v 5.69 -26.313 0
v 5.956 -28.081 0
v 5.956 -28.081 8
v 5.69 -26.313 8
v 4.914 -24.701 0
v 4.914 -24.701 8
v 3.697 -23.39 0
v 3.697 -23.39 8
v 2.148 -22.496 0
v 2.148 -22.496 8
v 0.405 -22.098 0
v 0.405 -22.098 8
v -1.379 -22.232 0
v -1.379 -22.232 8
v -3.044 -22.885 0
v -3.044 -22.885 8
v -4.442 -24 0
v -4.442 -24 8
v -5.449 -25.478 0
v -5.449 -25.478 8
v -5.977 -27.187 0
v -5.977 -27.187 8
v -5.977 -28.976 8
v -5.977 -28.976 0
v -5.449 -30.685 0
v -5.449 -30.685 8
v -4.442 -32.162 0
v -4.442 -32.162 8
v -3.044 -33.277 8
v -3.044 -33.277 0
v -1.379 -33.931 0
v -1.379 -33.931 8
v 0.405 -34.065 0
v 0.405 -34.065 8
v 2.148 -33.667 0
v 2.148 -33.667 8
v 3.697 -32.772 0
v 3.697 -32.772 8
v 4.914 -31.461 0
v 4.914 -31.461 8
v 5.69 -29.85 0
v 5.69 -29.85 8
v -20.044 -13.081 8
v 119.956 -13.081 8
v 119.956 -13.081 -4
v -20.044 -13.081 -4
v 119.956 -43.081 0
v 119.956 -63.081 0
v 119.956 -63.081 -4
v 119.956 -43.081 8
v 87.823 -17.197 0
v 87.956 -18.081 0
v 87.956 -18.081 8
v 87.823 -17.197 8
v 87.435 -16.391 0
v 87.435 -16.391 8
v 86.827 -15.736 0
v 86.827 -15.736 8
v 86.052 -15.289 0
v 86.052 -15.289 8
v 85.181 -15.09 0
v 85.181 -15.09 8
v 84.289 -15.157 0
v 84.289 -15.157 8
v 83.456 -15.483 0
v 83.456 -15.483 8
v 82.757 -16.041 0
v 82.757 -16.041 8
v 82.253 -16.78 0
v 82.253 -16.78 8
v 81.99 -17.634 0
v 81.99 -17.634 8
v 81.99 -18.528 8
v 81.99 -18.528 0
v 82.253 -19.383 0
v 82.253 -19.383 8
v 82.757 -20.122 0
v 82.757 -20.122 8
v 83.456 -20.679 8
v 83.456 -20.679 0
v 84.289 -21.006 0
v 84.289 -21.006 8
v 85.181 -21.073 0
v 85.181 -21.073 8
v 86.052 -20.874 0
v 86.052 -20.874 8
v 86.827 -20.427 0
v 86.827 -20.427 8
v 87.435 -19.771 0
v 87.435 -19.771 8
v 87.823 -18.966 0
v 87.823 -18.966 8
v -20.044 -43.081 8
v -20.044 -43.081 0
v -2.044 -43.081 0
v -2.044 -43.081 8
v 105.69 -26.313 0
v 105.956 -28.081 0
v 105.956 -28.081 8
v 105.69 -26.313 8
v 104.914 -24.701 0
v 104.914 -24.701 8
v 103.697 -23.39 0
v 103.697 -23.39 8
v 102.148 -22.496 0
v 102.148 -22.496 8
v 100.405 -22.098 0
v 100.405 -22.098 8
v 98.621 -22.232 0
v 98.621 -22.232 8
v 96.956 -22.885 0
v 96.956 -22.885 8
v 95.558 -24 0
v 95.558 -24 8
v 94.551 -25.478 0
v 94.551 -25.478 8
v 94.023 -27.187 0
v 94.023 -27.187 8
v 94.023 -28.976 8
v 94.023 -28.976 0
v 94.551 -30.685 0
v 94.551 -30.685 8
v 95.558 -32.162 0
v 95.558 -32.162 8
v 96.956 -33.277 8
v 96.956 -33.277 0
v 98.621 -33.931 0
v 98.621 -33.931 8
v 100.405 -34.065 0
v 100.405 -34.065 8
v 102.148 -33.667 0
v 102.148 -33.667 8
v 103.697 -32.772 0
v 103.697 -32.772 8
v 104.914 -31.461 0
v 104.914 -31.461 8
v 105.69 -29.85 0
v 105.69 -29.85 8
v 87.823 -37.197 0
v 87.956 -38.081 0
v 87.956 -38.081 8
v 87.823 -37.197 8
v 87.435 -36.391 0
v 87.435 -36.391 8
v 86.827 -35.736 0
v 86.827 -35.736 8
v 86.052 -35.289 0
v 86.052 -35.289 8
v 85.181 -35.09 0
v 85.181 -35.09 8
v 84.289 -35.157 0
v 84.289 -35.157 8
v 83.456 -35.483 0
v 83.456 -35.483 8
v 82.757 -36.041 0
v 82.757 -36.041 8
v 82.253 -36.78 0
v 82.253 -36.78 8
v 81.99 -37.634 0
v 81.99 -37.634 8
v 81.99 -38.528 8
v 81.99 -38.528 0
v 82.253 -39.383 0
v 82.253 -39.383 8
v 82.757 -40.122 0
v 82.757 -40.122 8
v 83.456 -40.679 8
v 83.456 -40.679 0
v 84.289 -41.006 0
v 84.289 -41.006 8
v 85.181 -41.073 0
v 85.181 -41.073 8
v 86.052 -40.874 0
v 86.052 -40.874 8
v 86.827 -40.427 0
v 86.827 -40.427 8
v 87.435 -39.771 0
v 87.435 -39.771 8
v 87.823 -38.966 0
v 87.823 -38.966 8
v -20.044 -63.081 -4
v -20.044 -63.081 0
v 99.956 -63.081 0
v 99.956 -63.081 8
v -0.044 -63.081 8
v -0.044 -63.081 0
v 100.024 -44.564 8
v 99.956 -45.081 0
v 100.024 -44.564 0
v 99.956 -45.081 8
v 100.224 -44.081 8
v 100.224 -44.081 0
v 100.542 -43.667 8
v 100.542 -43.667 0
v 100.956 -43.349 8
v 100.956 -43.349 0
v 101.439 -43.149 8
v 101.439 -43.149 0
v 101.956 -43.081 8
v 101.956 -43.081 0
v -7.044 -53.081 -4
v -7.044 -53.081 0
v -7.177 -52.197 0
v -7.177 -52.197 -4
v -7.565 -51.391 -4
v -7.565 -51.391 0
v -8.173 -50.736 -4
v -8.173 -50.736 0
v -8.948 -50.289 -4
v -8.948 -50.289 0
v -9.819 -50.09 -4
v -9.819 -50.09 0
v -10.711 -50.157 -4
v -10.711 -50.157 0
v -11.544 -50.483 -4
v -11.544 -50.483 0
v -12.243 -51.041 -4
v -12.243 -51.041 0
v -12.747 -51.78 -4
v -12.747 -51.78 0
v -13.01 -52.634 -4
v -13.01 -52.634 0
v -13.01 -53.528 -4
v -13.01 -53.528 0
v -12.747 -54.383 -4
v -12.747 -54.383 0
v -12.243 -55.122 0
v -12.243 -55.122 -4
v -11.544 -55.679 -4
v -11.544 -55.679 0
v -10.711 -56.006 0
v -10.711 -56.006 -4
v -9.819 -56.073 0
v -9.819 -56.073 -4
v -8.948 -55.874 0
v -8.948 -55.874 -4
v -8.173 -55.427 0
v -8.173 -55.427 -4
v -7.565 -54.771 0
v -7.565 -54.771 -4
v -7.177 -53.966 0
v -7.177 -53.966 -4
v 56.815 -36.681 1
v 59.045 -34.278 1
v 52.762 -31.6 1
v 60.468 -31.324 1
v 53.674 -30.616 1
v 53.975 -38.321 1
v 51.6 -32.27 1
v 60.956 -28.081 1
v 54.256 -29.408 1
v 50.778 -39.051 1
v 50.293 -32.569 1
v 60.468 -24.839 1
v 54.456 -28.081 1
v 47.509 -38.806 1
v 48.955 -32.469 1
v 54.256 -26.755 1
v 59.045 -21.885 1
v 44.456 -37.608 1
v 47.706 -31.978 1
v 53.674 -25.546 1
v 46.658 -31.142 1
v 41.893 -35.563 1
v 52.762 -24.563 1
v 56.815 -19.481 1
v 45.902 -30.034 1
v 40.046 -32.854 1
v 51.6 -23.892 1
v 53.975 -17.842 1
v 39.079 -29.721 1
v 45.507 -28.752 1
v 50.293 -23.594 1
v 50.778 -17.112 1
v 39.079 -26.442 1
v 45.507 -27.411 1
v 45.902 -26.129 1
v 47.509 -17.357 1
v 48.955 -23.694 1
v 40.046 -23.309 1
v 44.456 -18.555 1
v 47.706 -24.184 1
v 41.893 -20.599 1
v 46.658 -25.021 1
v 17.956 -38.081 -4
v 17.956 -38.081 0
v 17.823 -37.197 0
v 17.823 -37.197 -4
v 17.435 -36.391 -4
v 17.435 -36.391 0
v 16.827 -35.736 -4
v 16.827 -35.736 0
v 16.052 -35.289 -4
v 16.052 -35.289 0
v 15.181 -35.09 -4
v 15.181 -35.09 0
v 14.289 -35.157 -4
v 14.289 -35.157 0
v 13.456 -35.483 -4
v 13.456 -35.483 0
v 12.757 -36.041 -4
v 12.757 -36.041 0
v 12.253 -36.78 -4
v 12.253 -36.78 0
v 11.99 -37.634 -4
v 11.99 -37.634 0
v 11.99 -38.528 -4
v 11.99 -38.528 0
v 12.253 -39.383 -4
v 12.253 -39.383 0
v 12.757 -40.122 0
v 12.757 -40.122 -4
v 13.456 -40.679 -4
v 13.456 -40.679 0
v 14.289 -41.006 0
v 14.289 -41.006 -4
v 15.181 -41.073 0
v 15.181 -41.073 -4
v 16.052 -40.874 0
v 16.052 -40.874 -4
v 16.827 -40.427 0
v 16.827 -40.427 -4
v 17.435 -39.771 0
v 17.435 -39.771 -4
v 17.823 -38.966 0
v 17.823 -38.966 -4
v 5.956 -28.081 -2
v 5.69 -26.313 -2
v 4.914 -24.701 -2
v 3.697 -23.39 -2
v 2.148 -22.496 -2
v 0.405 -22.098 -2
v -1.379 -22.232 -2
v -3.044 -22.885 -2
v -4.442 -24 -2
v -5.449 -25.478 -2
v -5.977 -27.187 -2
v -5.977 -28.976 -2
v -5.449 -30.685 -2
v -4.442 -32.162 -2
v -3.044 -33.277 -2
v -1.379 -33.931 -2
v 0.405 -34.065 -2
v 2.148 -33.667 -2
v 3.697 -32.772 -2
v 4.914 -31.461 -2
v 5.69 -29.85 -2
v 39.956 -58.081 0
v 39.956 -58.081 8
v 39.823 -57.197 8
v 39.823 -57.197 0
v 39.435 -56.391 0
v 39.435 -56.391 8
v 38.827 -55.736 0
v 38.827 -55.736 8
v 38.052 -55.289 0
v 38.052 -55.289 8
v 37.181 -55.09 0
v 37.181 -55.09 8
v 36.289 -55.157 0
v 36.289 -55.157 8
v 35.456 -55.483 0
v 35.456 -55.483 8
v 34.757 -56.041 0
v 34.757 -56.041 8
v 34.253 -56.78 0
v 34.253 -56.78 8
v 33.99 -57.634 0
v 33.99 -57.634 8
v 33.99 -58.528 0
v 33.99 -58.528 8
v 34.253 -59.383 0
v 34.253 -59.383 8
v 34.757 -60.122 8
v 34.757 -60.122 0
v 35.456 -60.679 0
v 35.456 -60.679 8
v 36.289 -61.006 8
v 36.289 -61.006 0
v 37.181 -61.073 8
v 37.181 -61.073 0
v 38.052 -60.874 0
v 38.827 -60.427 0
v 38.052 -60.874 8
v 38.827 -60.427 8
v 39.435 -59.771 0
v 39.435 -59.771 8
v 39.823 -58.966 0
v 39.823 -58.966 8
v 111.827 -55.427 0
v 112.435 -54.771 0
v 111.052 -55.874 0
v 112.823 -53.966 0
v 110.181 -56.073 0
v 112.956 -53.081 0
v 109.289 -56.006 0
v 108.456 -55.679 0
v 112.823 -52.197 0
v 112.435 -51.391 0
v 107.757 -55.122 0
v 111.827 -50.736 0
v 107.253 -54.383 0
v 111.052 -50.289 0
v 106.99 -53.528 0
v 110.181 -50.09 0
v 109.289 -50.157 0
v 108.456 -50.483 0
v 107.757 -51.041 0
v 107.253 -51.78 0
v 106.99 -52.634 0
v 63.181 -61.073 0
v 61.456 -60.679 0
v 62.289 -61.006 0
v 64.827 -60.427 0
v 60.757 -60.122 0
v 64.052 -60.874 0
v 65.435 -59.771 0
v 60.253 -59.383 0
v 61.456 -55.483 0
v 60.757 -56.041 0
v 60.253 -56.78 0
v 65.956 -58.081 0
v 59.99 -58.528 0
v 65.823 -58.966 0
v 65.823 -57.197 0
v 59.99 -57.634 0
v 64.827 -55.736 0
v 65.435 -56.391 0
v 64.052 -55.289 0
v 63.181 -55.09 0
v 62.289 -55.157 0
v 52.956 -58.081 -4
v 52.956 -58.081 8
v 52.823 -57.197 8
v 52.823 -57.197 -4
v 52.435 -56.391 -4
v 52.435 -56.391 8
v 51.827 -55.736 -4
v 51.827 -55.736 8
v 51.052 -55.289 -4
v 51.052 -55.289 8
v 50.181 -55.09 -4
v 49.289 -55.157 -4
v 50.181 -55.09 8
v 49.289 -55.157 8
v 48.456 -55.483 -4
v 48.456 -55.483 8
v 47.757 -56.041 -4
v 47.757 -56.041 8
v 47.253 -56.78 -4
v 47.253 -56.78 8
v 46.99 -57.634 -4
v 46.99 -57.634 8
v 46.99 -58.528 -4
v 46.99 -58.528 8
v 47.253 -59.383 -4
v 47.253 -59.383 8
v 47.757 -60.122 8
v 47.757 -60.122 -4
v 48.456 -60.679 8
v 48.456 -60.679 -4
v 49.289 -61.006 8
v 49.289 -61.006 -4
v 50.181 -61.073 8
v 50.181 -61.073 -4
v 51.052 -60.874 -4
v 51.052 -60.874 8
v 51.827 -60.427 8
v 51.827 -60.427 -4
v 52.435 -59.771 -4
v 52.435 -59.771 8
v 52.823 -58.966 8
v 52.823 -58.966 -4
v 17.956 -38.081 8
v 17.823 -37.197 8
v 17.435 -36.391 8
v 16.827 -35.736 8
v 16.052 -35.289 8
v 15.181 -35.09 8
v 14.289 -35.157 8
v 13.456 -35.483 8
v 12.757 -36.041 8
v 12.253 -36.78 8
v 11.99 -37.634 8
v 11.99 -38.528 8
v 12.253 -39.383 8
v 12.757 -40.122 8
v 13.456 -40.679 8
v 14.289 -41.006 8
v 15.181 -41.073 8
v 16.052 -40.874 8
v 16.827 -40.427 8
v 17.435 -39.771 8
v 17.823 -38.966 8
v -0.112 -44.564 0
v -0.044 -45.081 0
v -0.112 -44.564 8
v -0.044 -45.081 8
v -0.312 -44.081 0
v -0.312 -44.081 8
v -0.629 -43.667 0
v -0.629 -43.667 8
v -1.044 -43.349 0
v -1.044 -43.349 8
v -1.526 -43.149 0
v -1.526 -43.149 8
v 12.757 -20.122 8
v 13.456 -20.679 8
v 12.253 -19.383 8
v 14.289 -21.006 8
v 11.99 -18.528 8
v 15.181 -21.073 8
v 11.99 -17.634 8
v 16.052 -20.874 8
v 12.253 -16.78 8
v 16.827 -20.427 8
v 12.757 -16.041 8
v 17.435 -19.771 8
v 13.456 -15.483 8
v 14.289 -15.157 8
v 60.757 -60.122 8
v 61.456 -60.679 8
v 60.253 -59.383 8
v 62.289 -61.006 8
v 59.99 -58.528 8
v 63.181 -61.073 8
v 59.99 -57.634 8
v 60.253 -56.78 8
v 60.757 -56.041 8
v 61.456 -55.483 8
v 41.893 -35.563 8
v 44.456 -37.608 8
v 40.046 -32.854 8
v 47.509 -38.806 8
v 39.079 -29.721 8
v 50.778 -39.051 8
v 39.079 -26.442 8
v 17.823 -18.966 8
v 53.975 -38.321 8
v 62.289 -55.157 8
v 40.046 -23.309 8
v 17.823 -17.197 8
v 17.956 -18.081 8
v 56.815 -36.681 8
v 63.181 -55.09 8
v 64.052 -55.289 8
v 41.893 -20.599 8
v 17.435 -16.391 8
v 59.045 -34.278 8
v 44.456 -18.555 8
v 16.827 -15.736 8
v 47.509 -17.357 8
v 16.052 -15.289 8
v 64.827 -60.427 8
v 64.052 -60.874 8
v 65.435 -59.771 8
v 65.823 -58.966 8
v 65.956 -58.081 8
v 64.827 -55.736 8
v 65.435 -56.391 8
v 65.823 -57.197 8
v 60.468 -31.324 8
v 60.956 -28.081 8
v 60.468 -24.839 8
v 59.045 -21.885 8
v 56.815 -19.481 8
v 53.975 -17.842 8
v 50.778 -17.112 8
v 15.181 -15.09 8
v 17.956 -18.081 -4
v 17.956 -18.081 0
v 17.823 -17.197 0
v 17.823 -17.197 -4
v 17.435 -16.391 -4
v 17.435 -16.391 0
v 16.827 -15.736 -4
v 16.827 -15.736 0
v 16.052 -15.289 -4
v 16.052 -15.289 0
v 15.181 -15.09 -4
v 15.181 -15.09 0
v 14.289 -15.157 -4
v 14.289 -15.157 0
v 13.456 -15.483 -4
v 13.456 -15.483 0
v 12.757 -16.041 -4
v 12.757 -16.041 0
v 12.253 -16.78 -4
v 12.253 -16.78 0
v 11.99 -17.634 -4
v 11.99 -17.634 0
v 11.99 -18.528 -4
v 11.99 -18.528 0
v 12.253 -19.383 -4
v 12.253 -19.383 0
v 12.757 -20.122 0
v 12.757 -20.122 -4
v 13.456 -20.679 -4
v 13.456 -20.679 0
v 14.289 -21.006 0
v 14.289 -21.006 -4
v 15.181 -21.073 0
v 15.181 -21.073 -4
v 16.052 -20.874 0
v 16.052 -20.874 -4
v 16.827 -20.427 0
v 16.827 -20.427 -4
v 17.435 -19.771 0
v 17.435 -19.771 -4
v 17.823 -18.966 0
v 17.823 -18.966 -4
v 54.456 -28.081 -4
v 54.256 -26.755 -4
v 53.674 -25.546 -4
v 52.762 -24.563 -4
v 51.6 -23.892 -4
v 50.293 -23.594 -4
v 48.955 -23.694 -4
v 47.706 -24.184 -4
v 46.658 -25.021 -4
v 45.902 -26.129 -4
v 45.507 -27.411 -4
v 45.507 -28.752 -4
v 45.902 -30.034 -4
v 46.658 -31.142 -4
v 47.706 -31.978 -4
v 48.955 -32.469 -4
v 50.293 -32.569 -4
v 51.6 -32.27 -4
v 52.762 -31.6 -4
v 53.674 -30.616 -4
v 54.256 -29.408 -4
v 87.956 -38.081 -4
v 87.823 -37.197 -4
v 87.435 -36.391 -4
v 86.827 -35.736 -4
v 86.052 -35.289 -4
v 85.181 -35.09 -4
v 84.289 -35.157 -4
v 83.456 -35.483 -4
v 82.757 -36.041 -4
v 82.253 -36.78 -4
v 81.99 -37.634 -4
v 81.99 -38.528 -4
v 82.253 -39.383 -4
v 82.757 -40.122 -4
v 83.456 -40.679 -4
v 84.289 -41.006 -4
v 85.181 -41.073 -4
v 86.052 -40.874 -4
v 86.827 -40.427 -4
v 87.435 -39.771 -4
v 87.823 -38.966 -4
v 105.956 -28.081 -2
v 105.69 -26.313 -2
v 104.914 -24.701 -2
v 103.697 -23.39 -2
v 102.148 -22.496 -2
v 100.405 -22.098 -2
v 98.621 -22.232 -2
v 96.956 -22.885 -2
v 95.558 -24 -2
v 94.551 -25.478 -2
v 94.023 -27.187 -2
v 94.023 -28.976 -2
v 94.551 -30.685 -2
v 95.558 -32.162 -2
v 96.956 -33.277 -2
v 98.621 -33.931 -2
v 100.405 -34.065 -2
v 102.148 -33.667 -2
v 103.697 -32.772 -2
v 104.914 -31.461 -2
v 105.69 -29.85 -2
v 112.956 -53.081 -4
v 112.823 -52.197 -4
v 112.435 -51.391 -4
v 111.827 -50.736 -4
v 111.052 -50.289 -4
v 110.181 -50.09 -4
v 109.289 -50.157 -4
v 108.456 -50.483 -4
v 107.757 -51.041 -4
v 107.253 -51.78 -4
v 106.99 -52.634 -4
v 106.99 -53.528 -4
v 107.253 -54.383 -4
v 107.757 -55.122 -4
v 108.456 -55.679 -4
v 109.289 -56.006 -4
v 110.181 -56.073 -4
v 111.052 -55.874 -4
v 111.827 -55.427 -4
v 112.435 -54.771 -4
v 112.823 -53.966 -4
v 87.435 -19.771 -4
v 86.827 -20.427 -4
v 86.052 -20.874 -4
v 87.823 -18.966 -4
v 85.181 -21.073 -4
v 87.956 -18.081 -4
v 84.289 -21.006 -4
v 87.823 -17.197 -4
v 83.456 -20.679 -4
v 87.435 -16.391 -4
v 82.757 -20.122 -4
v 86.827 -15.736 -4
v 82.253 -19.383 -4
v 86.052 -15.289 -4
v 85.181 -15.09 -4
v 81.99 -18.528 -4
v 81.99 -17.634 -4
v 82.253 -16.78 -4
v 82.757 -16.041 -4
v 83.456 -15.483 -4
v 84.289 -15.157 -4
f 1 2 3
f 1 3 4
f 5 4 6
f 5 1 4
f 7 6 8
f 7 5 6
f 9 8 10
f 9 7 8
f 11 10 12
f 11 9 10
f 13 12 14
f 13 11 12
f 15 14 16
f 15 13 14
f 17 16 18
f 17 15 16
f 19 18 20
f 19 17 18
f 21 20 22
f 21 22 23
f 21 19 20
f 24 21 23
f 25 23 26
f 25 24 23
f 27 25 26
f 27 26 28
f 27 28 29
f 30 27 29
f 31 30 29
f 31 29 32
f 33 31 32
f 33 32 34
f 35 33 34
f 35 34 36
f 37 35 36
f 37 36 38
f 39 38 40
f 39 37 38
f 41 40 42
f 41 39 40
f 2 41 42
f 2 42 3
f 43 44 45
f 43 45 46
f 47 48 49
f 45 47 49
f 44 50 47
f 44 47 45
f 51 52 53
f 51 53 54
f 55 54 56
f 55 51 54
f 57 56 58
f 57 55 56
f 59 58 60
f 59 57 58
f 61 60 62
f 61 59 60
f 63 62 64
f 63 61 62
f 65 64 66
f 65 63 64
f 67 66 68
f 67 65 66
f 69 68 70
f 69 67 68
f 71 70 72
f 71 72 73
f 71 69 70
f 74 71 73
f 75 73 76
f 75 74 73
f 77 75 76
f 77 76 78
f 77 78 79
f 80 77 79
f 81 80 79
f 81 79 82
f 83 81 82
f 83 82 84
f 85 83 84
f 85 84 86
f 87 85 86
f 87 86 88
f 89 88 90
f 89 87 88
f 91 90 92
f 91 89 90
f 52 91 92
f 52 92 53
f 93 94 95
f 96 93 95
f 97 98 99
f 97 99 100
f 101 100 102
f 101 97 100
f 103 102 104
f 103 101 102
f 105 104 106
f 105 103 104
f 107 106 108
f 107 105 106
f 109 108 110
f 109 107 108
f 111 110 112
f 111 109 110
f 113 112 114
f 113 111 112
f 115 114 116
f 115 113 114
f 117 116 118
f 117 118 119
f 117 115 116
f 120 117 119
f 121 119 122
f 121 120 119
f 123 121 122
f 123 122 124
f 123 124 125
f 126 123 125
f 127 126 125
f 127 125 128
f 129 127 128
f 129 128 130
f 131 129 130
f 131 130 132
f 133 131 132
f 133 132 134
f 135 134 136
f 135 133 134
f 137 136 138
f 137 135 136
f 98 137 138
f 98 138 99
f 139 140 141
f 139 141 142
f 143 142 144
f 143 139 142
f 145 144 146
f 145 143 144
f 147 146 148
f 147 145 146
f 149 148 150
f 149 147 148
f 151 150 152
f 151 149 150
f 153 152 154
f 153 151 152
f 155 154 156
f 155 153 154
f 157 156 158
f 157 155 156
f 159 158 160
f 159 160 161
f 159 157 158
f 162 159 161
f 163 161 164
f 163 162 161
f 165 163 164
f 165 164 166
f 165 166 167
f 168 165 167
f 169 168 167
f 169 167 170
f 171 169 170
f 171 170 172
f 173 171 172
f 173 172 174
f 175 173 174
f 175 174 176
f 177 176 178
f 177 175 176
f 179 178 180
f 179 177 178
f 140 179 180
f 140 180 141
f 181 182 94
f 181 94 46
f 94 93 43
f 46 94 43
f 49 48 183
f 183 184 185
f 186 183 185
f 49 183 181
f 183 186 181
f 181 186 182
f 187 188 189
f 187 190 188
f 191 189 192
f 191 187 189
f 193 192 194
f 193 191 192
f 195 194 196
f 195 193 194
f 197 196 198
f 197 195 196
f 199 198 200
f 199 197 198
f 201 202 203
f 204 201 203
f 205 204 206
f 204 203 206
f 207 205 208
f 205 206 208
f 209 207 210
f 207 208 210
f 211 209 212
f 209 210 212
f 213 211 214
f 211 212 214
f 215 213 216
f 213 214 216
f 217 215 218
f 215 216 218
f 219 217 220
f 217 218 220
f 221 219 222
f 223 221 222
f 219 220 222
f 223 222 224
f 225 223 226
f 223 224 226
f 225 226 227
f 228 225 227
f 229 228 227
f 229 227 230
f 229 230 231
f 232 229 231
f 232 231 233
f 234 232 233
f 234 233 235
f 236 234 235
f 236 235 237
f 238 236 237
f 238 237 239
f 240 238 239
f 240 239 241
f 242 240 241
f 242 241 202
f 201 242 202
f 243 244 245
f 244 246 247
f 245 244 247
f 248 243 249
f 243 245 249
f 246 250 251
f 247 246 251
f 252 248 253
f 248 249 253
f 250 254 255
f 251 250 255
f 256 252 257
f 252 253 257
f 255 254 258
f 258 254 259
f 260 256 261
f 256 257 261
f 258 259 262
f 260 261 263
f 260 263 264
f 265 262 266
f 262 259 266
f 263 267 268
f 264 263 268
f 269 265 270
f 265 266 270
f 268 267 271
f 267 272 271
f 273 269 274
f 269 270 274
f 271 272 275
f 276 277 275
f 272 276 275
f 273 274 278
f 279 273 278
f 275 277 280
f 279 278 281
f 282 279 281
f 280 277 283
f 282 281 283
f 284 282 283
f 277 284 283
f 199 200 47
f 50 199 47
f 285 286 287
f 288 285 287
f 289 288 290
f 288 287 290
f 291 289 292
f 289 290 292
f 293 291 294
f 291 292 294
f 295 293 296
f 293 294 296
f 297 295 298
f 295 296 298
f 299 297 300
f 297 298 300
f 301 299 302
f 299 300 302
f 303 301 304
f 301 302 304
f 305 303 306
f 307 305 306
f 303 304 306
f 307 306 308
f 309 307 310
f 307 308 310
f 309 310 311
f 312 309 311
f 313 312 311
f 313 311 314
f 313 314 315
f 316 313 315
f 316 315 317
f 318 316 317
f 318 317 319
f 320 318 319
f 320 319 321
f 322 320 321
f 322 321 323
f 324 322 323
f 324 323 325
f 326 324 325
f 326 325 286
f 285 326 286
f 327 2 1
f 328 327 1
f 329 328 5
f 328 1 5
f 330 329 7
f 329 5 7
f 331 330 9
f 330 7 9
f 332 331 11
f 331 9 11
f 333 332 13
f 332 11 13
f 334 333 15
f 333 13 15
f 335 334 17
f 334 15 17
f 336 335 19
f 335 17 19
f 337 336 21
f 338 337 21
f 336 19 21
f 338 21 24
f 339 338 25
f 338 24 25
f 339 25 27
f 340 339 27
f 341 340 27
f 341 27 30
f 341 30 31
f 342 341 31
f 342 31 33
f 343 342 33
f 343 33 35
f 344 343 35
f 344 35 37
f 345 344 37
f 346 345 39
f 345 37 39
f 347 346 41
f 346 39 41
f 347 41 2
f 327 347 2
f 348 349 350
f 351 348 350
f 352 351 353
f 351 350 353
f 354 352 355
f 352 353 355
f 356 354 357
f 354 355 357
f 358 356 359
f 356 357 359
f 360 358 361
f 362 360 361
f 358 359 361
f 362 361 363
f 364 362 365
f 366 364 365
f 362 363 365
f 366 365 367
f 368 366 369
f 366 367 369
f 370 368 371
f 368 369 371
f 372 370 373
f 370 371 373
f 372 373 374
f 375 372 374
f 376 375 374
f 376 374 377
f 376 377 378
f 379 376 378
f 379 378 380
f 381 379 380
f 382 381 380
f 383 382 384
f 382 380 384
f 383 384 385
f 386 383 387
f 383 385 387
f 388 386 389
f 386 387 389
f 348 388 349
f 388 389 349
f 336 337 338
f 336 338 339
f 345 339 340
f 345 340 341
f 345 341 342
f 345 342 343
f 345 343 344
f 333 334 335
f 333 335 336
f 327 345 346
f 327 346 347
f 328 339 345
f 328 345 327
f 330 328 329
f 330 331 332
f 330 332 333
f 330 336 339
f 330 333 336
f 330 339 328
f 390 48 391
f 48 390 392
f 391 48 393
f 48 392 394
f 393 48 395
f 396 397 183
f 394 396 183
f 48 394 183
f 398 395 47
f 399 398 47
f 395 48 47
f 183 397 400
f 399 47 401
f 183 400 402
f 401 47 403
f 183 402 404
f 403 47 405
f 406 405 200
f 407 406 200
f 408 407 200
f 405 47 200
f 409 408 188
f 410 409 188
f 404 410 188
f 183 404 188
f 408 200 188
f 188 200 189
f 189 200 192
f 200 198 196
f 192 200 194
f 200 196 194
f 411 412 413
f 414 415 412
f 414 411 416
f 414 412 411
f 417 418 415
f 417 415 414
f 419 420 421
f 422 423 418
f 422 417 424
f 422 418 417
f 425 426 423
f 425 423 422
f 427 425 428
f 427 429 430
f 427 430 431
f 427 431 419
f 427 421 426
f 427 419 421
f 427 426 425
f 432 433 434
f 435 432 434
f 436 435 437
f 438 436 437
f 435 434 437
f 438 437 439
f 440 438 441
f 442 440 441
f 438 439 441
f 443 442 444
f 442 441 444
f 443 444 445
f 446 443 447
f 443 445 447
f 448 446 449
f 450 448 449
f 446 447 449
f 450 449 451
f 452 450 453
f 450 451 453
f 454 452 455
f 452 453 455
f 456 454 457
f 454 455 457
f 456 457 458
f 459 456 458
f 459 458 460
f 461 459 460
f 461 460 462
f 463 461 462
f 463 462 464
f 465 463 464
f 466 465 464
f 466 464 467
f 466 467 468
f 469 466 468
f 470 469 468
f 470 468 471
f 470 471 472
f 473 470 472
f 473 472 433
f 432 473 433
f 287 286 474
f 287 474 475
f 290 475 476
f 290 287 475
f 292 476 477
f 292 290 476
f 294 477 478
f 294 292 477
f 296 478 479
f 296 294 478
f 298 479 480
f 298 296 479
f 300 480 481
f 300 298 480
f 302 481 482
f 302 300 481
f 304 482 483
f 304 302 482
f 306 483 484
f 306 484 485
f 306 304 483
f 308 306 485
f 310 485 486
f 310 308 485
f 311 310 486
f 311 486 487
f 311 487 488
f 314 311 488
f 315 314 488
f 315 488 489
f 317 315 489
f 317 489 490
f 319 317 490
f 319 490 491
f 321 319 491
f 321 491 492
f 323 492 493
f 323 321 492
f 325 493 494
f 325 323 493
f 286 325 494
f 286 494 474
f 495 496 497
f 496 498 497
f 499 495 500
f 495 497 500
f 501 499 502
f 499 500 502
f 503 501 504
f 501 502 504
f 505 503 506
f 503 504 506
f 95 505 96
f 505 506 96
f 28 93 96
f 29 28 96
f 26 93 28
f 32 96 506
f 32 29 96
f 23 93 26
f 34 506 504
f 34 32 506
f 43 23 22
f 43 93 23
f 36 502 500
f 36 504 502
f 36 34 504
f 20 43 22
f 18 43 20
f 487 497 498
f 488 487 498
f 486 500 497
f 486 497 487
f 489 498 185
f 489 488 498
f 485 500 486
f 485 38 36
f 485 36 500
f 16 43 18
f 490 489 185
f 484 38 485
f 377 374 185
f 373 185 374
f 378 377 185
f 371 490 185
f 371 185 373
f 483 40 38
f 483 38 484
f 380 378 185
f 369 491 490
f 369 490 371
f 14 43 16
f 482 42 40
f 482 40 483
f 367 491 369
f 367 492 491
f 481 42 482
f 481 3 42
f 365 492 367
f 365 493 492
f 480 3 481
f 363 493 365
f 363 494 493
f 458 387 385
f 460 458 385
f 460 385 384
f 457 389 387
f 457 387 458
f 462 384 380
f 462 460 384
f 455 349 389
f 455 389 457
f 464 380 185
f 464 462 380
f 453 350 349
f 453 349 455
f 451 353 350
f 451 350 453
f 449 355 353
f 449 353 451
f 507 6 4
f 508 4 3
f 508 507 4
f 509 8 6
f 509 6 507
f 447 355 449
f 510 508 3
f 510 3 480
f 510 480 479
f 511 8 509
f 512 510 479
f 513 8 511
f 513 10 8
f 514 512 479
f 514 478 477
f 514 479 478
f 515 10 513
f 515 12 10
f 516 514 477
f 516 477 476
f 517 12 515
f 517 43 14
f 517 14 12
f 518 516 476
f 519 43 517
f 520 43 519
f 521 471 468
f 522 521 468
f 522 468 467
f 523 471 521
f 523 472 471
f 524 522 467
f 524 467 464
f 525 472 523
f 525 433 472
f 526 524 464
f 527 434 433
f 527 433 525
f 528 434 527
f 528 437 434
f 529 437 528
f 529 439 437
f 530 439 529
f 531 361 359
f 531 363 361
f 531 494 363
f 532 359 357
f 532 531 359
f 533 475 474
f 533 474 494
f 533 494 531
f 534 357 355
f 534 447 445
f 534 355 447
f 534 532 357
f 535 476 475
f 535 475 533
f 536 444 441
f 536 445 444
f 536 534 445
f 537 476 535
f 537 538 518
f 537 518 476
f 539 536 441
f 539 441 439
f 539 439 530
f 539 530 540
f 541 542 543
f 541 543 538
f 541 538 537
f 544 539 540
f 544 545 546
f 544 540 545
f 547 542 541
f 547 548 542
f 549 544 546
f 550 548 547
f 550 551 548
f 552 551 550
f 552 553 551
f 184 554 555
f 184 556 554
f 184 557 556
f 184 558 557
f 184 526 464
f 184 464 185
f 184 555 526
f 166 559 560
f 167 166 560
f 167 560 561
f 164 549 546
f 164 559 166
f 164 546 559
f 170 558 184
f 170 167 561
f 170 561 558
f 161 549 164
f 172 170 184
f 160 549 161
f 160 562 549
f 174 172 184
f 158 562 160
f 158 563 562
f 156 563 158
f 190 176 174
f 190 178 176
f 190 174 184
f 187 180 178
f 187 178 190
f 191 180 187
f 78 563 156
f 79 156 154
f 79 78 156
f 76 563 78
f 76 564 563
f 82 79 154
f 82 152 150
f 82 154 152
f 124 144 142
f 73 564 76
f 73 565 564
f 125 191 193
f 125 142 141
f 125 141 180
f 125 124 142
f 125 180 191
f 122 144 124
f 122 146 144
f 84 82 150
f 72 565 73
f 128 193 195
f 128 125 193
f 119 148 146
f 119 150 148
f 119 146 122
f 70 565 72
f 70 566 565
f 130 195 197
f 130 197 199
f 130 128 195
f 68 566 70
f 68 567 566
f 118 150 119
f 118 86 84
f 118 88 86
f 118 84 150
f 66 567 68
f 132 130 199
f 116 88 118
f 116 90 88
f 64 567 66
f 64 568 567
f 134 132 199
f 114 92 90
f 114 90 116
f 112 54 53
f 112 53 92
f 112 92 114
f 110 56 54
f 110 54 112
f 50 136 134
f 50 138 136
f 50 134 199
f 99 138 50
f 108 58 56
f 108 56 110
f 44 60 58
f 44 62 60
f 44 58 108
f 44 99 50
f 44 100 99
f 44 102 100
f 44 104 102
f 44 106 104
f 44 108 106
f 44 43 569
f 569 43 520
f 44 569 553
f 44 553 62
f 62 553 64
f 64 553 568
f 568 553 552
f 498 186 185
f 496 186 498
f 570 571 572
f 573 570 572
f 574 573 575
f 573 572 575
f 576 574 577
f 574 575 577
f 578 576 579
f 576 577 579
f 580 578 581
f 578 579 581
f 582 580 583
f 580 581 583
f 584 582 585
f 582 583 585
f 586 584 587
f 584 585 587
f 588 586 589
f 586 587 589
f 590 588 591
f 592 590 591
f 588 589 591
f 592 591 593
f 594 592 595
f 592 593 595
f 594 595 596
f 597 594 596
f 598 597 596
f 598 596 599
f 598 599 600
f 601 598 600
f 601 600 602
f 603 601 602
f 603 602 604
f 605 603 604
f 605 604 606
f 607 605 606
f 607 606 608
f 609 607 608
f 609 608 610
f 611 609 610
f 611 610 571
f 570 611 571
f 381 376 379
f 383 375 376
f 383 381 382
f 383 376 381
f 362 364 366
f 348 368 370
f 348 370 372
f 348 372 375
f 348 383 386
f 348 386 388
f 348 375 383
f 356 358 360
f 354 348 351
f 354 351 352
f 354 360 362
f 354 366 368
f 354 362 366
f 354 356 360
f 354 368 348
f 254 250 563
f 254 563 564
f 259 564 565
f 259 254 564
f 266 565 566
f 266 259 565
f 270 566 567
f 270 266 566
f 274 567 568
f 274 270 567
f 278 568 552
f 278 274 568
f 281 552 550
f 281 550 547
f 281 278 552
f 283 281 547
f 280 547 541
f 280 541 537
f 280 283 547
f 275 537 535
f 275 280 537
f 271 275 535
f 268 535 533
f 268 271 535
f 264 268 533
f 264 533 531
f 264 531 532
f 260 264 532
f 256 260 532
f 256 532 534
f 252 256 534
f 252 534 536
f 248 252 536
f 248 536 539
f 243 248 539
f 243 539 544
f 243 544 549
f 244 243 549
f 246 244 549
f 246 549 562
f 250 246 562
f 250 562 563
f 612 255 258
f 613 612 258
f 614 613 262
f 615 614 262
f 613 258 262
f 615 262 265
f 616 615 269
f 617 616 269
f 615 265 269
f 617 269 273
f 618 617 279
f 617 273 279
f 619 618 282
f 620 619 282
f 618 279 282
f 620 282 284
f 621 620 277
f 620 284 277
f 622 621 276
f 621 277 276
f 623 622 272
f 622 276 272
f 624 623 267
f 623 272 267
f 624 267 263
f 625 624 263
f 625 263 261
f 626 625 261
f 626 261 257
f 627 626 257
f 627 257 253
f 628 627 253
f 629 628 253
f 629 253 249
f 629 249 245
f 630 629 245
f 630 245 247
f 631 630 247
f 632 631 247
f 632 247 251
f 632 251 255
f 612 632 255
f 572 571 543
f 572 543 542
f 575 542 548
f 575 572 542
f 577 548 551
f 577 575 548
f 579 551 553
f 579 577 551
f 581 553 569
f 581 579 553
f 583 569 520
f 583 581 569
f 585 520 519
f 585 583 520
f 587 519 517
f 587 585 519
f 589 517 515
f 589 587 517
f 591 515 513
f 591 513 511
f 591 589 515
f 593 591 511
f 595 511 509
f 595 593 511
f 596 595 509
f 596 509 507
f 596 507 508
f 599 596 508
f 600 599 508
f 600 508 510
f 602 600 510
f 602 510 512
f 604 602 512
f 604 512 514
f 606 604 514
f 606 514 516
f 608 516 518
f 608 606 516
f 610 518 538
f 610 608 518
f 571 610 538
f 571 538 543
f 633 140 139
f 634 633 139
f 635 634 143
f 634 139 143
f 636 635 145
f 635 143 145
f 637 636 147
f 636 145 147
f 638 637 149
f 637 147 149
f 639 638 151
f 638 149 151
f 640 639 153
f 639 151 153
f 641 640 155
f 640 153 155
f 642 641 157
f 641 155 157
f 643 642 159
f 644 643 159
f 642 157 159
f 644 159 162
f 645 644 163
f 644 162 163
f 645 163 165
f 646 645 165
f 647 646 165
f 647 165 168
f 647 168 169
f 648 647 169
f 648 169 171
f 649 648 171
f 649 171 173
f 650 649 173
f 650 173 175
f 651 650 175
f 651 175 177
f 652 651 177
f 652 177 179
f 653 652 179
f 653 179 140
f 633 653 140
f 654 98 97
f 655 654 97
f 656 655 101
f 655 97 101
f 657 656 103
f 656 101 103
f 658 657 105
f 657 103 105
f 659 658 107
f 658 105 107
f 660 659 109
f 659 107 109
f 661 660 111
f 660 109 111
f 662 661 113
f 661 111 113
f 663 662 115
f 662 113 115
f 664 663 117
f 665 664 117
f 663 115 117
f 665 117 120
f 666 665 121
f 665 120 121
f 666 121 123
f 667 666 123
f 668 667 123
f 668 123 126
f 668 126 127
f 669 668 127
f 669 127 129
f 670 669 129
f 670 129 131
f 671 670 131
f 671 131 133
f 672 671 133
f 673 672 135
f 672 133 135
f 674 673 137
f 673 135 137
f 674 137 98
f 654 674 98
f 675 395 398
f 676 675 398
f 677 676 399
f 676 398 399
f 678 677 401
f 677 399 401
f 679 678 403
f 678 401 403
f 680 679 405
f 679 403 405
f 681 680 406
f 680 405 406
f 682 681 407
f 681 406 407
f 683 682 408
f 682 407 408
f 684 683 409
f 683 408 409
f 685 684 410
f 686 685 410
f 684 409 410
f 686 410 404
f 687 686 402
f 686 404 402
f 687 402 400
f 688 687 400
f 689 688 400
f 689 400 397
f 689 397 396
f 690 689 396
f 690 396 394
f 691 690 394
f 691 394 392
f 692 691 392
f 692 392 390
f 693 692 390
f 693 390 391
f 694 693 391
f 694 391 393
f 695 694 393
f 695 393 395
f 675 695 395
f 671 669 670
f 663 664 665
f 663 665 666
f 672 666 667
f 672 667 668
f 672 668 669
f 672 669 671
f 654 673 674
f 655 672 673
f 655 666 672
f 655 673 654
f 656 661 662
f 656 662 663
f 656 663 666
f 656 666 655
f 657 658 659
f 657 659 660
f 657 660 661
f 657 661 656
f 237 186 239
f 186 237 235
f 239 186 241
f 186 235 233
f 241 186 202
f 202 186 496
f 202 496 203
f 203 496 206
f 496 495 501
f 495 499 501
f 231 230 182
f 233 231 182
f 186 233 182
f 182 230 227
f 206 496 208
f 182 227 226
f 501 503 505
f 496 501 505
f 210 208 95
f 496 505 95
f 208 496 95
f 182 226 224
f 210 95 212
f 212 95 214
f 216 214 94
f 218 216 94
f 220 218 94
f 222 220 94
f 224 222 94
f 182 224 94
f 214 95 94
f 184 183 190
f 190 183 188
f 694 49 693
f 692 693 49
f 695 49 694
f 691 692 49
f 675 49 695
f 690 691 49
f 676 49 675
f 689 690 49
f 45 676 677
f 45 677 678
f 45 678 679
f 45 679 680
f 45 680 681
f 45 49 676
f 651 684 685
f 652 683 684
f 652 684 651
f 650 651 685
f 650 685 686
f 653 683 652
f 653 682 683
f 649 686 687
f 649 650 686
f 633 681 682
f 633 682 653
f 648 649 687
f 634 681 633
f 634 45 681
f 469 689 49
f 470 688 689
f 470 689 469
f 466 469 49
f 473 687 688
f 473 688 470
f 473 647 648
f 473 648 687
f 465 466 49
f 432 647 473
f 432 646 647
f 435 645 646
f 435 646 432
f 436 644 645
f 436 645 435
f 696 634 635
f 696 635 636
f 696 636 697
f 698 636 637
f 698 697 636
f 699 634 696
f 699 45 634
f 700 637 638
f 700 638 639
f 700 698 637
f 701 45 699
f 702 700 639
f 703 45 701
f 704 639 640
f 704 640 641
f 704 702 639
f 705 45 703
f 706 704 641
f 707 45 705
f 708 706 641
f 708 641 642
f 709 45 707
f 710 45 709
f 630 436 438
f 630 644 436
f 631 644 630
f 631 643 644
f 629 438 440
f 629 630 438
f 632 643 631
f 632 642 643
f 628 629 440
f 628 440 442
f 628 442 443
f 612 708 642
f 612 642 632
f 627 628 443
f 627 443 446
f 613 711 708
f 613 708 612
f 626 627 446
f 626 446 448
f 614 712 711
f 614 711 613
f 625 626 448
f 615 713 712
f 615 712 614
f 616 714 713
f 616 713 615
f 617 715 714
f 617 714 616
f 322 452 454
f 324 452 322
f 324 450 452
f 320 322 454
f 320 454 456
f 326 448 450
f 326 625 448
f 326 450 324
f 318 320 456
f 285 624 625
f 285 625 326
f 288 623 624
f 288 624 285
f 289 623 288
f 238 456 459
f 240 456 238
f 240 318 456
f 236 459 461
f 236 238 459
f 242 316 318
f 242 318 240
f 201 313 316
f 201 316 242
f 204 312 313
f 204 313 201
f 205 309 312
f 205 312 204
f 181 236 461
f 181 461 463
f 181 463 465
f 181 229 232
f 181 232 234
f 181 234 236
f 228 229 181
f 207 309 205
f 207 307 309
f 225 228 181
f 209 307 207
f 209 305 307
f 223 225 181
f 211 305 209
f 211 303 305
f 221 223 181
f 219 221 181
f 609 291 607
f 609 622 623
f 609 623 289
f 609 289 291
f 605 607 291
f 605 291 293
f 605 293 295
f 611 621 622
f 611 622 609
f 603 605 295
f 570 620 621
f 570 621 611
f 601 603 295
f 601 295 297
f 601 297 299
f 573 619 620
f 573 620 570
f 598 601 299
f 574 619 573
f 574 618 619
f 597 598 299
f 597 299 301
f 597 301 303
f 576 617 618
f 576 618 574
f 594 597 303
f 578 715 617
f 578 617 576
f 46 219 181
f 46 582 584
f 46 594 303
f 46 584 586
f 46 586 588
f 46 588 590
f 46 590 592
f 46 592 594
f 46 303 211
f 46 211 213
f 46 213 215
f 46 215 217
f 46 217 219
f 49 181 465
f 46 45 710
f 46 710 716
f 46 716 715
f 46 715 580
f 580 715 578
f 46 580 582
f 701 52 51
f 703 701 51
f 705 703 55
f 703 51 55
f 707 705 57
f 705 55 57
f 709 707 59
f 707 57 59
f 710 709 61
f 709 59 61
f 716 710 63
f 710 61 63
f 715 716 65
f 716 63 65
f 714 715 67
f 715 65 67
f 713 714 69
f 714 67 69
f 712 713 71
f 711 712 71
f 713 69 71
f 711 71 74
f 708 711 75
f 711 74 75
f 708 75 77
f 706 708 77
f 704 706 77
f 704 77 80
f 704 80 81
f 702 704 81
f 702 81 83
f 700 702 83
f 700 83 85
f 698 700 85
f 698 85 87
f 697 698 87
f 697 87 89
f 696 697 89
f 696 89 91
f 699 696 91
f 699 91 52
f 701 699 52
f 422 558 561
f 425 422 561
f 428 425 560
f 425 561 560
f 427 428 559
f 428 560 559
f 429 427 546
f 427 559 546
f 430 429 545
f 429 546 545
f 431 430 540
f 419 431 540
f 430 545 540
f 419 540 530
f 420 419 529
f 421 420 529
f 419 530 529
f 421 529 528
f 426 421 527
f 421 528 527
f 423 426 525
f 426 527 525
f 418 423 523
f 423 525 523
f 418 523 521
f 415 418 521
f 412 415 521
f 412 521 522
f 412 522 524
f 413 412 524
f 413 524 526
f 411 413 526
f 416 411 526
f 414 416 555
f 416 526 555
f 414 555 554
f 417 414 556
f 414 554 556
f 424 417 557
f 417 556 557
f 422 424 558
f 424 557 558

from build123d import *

# Parameters (mm, degrees)
ESQUISSE1_W             = 140
ESQUISSE1_H             = 30
ESQUISSE1_R             = 11
ESQUISSE1_R_2           = 6
ESQUISSE1_R_3           = 3
EXTRUSION1_DEPTH        = 8
ESQUISSE2_W             = 140
ESQUISSE2_H             = 50
BOSS_EXTRU_1_DEPTH      = 4
ESQUISSE3_R             = 3
ENL_V_MAT_EXTRU_1_DEPTH = 5
ESQUISSE4_R             = 11
ESQUISSE4_R_2           = 3
ENL_V_MAT_EXTRU_2_DEPTH = 5
ESQUISSE5_W             = 100
ESQUISSE5_H             = 20
BOSS_EXTRU_2_DEPTH      = 8
ESQUISSE6_R             = 3
ENL_V_MAT_EXTRU_3_DEPTH = 8
ESQUISSE7_R             = 11
BOSS_EXTRU_3_DEPTH      = 5
ESQUISSE8_R             = 4.5
ENL_V_MAT_EXTRU_4_DEPTH = 6
ESQUISSE9_R             = 6
ENL_V_MAT_EXTRU_5_DEPTH = 2
ESQUISSE10_R            = 3
ENL_V_MAT_EXTRU_6_DEPTH = 13
CONG_1_R                = 2
CONG_2_R                = 2


with BuildPart() as part:
    # Esquisse1 → Extrusion1 (new body)
    with BuildSketch(Plane.XY):
        with Locations((49.95634141, -28.081325038)):
            Rectangle(ESQUISSE1_W, ESQUISSE1_H)
        with Locations((49.95634141, -28.081325038)):
            Circle(ESQUISSE1_R, mode=Mode.SUBTRACT)
        with Locations((-0.04365859, -28.081325038)):
            Circle(ESQUISSE1_R_2, mode=Mode.SUBTRACT)
        with Locations((99.95634141, -28.081325038)):
            Circle(ESQUISSE1_R_2, mode=Mode.SUBTRACT)
        with Locations((14.95634141, -18.081325038)):
            Circle(ESQUISSE1_R_3, mode=Mode.SUBTRACT)
        with Locations((14.95634141, -38.081325038)):
            Circle(ESQUISSE1_R_3, mode=Mode.SUBTRACT)
        with Locations((84.95634141, -18.081325038)):
            Circle(ESQUISSE1_R_3, mode=Mode.SUBTRACT)
        with Locations((84.95634141, -38.081325038)):
            Circle(ESQUISSE1_R_3, mode=Mode.SUBTRACT)
    extrude(amount=EXTRUSION1_DEPTH)

    # Esquisse2 → Boss.-Extru.1 (add)
    with BuildSketch(Plane(origin=(0, 0, 0), x_dir=(-1, 0, 0), z_dir=(0, 0, -1))):
        with Locations((-49.95634141, -38.081325038)):
            Rectangle(ESQUISSE2_W, ESQUISSE2_H)
    extrude(amount=BOSS_EXTRU_1_DEPTH)

    # Esquisse3 → Enlèv. mat.-Extru.1 (cut, through all)
    with BuildSketch(Plane.XY):
        with Locations((-10.04365859, -53.081325038)):
            Circle(ESQUISSE3_R)
        with Locations((109.95634141, -53.081325038)):
            Circle(ESQUISSE3_R)
    extrude(amount=-ENL_V_MAT_EXTRU_1_DEPTH, mode=Mode.SUBTRACT)

    # Esquisse4 → Enlèv. mat.-Extru.2 (cut, through all)
    with BuildSketch(Plane.XY):
        with Locations((49.95634141, -28.081325038)):
            Circle(ESQUISSE4_R)
        with Locations((14.95634141, -18.081325038)):
            Circle(ESQUISSE4_R_2)
        with Locations((14.95634141, -38.081325038)):
            Circle(ESQUISSE4_R_2)
        with Locations((84.95634141, -18.081325038)):
            Circle(ESQUISSE4_R_2)
        with Locations((84.95634141, -38.081325038)):
            Circle(ESQUISSE4_R_2)
    extrude(amount=-ENL_V_MAT_EXTRU_2_DEPTH, mode=Mode.SUBTRACT)

    # Esquisse5 → Boss.-Extru.2 (add)
    with BuildSketch(Plane.XY):
        with Locations((49.95634141, -53.081325038)):
            Rectangle(ESQUISSE5_W, ESQUISSE5_H)
    extrude(amount=BOSS_EXTRU_2_DEPTH)

    # Esquisse6 → Enlèv. mat.-Extru.3 (cut)
    with BuildSketch(Plane.XY.offset(8)):
        with Locations((62.95634141, -58.081325038)):
            Circle(ESQUISSE6_R)
        with Locations((36.95634141, -58.081325038)):
            Circle(ESQUISSE6_R)
    extrude(amount=-ENL_V_MAT_EXTRU_3_DEPTH, mode=Mode.SUBTRACT)

    # Esquisse7 → Boss.-Extru.3 (add)
    with BuildSketch(Plane(origin=(0, 0, -4), x_dir=(-1, 0, 0), z_dir=(0, 0, -1))):
        with Locations((-49.95634141, -28.081325038)):
            Circle(ESQUISSE7_R)
    extrude(amount=-BOSS_EXTRU_3_DEPTH)

    # Esquisse8 → Enlèv. mat.-Extru.4 (cut, through all)
    with BuildSketch(Plane.XY.offset(1)):
        with Locations((49.95634141, -28.081325038)):
            Circle(ESQUISSE8_R)
    extrude(amount=-ENL_V_MAT_EXTRU_4_DEPTH, mode=Mode.SUBTRACT)

    # Esquisse9 → Enlèv. mat.-Extru.5 (cut)
    with BuildSketch(Plane.XY):
        with Locations((-0.04365859, -28.081325038)):
            Circle(ESQUISSE9_R)
        with Locations((99.95634141, -28.081325038)):
            Circle(ESQUISSE9_R)
    extrude(amount=-ENL_V_MAT_EXTRU_5_DEPTH, mode=Mode.SUBTRACT)

    # Esquisse10 → Enlèv. mat.-Extru.6 (cut, through all)
    with BuildSketch(Plane.XY.offset(8)):
        with Locations((49.95634141, -58.081325038)):
            Circle(ESQUISSE10_R)
    extrude(amount=-ENL_V_MAT_EXTRU_6_DEPTH, mode=Mode.SUBTRACT)

    # Congé1
    cong_1_edges = [part.edges().sort_by_distance(p)[0] for p in [
        (-0.04365859, -43.081325038, 4),
    ]]
    fillet(cong_1_edges, radius=CONG_1_R)

    # Congé2
    cong_2_edges = [part.edges().sort_by_distance(p)[0] for p in [
        (99.95634141, -43.081325038, 4),
    ]]
    fillet(cong_2_edges, radius=CONG_2_R)


solid = part.part
